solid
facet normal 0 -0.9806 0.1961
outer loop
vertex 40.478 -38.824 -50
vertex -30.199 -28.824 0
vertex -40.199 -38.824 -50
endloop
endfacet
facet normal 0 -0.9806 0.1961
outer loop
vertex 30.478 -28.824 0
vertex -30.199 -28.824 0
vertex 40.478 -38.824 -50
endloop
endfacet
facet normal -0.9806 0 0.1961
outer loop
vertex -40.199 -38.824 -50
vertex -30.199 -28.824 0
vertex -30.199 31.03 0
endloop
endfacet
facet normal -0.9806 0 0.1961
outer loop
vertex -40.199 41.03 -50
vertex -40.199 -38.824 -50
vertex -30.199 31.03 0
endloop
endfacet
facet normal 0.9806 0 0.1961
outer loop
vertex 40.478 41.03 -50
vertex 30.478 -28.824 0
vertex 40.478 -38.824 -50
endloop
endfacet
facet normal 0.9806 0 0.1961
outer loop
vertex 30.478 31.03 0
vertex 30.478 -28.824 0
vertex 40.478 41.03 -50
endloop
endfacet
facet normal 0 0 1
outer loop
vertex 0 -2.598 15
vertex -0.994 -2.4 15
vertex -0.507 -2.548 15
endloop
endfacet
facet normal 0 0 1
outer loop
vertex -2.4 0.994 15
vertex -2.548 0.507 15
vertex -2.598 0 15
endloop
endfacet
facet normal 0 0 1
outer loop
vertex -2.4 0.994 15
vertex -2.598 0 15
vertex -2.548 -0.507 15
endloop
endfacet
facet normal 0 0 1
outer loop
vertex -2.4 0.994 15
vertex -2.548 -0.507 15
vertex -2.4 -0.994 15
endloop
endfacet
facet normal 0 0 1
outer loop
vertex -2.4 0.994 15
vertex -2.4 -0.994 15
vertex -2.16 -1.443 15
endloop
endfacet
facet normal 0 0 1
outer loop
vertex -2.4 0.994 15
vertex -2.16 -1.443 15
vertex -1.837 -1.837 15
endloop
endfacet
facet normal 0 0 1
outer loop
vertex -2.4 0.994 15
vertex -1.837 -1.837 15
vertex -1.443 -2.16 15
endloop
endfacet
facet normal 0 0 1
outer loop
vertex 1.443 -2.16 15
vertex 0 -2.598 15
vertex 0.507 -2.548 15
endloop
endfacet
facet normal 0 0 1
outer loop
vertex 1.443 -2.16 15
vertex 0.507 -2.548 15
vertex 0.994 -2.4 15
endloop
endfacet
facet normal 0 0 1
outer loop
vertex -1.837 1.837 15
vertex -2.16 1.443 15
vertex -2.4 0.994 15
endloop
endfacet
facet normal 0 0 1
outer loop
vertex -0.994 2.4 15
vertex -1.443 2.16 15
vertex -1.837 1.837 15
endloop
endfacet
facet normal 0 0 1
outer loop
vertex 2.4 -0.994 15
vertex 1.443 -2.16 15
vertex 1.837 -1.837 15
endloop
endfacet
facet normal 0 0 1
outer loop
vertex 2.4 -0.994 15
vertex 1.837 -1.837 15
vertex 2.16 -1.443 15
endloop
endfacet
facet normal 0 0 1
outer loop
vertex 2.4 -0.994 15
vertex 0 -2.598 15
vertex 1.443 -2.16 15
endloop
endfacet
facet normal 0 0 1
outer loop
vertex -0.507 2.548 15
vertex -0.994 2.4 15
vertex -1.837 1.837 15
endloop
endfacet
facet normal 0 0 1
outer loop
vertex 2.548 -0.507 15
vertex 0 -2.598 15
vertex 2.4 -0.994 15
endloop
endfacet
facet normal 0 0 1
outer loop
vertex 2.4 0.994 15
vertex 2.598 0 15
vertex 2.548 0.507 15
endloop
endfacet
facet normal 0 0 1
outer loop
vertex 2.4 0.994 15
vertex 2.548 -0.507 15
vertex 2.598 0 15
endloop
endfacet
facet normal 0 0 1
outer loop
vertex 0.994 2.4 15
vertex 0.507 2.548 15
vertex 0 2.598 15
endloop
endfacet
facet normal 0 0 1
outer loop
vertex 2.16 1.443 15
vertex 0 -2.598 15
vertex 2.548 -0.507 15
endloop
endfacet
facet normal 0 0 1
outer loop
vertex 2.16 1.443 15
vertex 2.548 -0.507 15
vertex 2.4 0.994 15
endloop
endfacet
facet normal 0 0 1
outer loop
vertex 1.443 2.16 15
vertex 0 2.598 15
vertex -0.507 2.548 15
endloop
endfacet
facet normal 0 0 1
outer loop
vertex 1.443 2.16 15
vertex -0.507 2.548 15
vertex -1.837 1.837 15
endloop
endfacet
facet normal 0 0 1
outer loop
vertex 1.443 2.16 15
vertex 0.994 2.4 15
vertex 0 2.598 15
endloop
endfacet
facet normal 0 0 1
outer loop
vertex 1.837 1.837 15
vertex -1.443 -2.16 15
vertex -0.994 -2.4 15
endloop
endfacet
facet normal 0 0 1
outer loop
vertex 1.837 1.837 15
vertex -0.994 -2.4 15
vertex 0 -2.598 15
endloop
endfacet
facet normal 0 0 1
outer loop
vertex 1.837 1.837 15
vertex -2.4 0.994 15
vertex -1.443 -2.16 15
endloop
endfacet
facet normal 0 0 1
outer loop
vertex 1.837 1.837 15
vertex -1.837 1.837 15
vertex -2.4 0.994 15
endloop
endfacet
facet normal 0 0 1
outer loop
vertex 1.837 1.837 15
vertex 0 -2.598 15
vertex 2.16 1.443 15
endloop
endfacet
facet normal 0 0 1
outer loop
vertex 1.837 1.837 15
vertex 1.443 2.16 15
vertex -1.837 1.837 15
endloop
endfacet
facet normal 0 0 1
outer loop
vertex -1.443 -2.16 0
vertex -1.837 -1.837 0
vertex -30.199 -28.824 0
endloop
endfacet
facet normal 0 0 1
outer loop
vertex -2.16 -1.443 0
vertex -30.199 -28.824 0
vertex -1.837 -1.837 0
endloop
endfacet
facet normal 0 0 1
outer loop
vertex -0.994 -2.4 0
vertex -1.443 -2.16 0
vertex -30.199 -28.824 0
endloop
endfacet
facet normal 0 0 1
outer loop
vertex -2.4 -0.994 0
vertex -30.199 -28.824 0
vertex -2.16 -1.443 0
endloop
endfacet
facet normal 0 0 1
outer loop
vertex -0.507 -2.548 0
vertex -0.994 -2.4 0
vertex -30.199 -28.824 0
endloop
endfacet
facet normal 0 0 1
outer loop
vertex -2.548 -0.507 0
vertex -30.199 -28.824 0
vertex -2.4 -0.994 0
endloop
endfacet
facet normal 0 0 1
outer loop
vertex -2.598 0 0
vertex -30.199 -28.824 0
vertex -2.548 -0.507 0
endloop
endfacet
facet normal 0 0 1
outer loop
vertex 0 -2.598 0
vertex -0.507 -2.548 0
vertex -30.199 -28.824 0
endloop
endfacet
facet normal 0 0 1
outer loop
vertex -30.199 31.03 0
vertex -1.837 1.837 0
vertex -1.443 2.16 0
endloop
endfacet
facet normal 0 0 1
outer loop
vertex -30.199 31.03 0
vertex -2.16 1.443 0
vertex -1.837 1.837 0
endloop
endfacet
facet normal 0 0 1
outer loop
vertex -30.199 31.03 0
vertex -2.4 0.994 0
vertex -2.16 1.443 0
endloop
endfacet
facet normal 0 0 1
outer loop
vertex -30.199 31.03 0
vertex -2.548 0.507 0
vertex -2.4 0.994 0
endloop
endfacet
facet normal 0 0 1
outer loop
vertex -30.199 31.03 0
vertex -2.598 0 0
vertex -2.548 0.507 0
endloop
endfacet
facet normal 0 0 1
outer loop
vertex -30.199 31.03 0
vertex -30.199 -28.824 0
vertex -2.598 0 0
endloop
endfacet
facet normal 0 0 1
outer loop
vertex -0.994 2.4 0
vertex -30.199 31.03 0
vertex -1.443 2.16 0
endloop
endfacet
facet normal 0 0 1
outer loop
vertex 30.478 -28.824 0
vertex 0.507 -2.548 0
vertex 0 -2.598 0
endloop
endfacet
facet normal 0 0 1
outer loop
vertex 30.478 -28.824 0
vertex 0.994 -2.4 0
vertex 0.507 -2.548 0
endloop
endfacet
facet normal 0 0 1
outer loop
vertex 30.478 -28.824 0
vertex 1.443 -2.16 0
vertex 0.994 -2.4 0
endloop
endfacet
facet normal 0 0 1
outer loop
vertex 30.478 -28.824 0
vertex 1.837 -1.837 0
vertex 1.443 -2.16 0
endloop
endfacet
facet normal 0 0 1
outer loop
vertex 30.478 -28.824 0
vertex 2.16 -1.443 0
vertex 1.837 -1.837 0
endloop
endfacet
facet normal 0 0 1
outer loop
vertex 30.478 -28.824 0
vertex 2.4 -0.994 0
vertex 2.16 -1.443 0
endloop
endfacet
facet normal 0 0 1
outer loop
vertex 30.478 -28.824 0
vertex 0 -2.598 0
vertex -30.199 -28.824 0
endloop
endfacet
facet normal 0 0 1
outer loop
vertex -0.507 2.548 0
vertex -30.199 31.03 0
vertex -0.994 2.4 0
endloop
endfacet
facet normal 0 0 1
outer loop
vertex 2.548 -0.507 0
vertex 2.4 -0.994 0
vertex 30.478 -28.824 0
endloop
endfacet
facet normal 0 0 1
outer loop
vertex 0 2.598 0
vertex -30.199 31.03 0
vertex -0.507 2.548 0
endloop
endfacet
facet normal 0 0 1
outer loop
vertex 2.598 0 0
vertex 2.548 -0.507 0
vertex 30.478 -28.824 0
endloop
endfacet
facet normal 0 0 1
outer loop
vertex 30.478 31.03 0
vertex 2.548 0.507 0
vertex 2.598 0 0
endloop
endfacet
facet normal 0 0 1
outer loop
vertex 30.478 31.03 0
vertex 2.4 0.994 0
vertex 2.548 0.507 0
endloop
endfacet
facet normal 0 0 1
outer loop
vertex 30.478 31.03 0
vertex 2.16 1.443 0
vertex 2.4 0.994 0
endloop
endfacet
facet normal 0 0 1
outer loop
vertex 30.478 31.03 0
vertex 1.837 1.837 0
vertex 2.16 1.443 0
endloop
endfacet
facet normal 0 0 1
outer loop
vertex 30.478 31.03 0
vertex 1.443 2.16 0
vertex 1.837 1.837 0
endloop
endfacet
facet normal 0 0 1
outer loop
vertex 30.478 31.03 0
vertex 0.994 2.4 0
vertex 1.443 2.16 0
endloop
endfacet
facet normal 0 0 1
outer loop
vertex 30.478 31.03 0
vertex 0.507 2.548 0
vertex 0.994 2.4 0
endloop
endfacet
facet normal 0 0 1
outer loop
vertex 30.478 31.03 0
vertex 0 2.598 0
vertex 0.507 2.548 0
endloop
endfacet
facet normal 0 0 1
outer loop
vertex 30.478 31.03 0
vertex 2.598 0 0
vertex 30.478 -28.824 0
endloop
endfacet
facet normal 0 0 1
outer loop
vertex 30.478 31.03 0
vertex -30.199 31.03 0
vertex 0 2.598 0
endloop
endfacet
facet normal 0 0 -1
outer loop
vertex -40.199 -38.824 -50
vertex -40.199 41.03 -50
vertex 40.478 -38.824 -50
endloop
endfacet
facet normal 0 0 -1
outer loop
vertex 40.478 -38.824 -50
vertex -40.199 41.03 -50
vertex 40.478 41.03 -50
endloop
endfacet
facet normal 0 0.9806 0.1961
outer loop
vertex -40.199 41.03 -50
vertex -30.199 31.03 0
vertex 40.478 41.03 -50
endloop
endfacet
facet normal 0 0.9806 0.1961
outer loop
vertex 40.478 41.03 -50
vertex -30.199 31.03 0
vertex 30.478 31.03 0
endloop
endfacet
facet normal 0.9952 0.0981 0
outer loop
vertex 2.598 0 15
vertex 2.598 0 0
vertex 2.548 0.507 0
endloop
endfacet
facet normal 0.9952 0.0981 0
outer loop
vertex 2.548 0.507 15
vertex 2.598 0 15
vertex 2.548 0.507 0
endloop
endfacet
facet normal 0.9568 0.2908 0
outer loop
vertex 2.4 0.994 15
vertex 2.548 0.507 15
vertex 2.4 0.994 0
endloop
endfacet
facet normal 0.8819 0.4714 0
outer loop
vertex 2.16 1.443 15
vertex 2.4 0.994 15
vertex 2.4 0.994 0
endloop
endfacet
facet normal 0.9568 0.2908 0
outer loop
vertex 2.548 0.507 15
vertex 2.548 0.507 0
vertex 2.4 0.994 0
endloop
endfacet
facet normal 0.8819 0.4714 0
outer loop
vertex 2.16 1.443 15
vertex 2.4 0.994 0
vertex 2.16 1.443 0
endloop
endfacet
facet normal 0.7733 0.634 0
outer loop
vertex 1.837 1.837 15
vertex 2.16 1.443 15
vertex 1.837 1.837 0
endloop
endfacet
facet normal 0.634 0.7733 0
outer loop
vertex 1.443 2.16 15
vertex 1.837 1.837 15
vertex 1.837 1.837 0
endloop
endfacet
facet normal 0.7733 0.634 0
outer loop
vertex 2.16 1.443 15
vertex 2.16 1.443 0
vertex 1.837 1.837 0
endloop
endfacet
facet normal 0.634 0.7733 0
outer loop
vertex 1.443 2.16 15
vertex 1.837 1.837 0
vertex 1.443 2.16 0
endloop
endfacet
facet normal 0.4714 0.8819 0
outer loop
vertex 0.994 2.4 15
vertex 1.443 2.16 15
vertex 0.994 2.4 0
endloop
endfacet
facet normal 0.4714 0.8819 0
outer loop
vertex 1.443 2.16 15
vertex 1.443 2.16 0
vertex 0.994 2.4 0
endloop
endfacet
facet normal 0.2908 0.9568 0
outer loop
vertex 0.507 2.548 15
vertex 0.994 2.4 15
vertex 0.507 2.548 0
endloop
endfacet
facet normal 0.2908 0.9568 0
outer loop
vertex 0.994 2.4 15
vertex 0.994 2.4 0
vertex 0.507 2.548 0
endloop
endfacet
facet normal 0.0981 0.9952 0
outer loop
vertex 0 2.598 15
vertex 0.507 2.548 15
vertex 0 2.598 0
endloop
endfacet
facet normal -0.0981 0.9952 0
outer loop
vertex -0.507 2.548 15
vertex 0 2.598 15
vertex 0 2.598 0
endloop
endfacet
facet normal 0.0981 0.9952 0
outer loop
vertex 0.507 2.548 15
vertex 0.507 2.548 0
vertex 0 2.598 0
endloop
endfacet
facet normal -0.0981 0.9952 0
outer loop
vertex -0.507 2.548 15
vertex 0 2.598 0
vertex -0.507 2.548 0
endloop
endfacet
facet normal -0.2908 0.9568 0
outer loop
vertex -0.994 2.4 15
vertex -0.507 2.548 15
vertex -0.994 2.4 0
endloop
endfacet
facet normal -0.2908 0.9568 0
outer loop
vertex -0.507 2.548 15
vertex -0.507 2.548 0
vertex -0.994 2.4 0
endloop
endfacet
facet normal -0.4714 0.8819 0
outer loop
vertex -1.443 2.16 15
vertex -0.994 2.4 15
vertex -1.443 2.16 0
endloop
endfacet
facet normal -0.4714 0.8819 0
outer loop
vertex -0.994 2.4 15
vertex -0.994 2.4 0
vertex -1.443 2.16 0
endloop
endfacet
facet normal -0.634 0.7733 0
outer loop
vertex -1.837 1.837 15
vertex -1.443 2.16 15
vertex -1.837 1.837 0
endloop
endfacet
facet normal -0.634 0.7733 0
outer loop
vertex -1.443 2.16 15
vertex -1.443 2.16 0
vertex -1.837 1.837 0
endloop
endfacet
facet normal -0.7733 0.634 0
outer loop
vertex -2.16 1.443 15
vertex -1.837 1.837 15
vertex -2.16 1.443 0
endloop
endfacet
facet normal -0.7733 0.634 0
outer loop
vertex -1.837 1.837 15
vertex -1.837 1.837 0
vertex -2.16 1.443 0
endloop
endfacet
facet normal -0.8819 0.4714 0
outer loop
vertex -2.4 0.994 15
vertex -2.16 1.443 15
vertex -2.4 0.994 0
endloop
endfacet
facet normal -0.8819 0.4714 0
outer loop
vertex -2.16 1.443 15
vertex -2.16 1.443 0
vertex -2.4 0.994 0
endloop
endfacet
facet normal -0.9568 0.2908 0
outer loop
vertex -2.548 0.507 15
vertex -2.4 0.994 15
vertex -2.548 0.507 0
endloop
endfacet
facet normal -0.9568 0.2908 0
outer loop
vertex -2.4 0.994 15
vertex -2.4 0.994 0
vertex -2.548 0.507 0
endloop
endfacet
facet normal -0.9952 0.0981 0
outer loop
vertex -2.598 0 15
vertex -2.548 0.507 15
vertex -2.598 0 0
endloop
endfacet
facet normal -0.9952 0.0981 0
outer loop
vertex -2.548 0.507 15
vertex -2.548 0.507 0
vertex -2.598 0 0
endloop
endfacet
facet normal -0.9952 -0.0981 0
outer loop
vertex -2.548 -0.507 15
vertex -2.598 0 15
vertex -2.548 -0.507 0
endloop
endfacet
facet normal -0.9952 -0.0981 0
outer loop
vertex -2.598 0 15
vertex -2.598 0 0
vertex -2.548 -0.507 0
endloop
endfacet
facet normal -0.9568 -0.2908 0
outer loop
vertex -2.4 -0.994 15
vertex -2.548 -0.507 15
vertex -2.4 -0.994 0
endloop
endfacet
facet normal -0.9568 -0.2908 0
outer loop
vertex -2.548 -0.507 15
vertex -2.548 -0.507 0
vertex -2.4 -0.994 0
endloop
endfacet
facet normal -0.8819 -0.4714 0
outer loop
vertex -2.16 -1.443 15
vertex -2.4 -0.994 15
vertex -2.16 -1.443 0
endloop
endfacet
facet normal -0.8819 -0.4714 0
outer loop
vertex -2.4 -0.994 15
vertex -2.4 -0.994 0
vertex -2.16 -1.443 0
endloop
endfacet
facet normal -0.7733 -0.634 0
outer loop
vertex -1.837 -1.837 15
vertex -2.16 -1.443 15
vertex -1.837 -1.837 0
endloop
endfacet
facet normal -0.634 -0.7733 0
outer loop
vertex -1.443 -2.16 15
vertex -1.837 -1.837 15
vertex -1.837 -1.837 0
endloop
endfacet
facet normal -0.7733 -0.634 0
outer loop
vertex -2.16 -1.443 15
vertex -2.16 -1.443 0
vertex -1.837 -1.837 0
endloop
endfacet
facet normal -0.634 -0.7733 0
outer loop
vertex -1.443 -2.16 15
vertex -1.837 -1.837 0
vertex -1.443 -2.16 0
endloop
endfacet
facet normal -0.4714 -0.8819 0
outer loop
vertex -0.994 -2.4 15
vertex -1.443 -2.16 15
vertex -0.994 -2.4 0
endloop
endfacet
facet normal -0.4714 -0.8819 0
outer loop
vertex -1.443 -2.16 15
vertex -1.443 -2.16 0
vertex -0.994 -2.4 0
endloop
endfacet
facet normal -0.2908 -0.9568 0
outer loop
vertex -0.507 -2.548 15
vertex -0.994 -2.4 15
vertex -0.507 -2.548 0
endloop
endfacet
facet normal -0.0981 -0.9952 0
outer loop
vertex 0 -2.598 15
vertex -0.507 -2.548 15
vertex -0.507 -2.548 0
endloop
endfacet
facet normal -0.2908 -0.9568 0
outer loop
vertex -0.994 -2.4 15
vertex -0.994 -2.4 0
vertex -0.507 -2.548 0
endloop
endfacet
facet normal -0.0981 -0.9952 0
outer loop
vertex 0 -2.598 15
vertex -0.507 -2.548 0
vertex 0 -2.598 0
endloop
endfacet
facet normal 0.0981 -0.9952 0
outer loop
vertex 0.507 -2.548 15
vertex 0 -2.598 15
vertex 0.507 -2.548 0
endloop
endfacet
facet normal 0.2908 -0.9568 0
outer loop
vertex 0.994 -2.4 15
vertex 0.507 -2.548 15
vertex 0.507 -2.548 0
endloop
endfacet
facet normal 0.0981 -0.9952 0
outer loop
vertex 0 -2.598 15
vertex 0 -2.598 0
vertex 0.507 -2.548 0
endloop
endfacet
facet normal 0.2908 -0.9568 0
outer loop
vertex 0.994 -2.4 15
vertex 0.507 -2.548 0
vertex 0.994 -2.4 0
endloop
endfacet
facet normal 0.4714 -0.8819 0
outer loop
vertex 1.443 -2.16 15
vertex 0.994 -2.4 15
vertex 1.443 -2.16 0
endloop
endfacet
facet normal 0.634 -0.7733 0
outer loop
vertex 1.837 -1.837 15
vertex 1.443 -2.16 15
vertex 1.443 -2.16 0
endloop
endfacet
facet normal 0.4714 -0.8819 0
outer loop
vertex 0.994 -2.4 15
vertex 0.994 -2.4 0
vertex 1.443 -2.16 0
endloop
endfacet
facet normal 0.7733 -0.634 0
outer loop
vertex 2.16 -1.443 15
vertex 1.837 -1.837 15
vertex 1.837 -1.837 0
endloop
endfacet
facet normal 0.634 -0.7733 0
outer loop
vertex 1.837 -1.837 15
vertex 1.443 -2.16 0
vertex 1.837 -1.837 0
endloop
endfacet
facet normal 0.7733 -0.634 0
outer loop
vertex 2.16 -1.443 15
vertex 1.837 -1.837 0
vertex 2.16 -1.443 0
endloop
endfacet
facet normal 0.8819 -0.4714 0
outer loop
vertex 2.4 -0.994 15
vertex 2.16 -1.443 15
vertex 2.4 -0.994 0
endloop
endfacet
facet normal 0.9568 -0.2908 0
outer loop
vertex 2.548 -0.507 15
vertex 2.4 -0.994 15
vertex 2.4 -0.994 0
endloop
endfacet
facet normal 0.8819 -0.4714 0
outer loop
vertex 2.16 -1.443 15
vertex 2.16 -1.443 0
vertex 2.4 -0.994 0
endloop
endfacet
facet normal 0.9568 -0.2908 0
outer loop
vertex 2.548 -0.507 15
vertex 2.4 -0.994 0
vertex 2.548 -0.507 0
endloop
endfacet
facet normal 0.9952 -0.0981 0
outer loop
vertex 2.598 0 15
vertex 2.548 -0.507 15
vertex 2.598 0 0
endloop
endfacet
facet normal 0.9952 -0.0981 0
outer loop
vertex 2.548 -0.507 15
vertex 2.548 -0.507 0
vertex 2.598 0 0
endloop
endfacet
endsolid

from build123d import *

# Parameters (mm, degrees)
F0_W     = 80.6774497032
F0_H     = 79.8543840647
F1_DEPTH = 50
F2_SIZE2 = 9.99999
F2_SIZE  = 49.99999
F3_R     = 2.5976453029
F4_DEPTH = 15


# Not quite as in the source:
# - a fillet or chamfer is up to 0.001 mm smaller than in the source, because OpenCascade refuses the exact size


with BuildPart() as f1:
    # F0 (on Top) → F1 (new body)
    with BuildSketch(Plane.XY):
        with Locations((0.1392643899, 1.1030137539)):
            Rectangle(F0_W, F0_H)
    extrude(amount=-F1_DEPTH)

    # F2 (size 50 and 10 in the source; OpenCascade refuses exactly that, so slightly less here)
    f2_edges = [f1.edges().sort_by_distance(p)[0] for p in [
        (0.139264, 41.030206, 0),
        (-40.19946, 1.103014, 0),
        (0.139264, -38.824178, 0),
        (40.477989, 1.103014, 0),
    ]]
    chamfer(f2_edges, length=F2_SIZE, length2=F2_SIZE2)

    # F3 (on Top) → F4 (join)
    with BuildSketch(Plane.XY):
        Circle(F3_R)
    extrude(amount=F4_DEPTH)


solid = f1.part
